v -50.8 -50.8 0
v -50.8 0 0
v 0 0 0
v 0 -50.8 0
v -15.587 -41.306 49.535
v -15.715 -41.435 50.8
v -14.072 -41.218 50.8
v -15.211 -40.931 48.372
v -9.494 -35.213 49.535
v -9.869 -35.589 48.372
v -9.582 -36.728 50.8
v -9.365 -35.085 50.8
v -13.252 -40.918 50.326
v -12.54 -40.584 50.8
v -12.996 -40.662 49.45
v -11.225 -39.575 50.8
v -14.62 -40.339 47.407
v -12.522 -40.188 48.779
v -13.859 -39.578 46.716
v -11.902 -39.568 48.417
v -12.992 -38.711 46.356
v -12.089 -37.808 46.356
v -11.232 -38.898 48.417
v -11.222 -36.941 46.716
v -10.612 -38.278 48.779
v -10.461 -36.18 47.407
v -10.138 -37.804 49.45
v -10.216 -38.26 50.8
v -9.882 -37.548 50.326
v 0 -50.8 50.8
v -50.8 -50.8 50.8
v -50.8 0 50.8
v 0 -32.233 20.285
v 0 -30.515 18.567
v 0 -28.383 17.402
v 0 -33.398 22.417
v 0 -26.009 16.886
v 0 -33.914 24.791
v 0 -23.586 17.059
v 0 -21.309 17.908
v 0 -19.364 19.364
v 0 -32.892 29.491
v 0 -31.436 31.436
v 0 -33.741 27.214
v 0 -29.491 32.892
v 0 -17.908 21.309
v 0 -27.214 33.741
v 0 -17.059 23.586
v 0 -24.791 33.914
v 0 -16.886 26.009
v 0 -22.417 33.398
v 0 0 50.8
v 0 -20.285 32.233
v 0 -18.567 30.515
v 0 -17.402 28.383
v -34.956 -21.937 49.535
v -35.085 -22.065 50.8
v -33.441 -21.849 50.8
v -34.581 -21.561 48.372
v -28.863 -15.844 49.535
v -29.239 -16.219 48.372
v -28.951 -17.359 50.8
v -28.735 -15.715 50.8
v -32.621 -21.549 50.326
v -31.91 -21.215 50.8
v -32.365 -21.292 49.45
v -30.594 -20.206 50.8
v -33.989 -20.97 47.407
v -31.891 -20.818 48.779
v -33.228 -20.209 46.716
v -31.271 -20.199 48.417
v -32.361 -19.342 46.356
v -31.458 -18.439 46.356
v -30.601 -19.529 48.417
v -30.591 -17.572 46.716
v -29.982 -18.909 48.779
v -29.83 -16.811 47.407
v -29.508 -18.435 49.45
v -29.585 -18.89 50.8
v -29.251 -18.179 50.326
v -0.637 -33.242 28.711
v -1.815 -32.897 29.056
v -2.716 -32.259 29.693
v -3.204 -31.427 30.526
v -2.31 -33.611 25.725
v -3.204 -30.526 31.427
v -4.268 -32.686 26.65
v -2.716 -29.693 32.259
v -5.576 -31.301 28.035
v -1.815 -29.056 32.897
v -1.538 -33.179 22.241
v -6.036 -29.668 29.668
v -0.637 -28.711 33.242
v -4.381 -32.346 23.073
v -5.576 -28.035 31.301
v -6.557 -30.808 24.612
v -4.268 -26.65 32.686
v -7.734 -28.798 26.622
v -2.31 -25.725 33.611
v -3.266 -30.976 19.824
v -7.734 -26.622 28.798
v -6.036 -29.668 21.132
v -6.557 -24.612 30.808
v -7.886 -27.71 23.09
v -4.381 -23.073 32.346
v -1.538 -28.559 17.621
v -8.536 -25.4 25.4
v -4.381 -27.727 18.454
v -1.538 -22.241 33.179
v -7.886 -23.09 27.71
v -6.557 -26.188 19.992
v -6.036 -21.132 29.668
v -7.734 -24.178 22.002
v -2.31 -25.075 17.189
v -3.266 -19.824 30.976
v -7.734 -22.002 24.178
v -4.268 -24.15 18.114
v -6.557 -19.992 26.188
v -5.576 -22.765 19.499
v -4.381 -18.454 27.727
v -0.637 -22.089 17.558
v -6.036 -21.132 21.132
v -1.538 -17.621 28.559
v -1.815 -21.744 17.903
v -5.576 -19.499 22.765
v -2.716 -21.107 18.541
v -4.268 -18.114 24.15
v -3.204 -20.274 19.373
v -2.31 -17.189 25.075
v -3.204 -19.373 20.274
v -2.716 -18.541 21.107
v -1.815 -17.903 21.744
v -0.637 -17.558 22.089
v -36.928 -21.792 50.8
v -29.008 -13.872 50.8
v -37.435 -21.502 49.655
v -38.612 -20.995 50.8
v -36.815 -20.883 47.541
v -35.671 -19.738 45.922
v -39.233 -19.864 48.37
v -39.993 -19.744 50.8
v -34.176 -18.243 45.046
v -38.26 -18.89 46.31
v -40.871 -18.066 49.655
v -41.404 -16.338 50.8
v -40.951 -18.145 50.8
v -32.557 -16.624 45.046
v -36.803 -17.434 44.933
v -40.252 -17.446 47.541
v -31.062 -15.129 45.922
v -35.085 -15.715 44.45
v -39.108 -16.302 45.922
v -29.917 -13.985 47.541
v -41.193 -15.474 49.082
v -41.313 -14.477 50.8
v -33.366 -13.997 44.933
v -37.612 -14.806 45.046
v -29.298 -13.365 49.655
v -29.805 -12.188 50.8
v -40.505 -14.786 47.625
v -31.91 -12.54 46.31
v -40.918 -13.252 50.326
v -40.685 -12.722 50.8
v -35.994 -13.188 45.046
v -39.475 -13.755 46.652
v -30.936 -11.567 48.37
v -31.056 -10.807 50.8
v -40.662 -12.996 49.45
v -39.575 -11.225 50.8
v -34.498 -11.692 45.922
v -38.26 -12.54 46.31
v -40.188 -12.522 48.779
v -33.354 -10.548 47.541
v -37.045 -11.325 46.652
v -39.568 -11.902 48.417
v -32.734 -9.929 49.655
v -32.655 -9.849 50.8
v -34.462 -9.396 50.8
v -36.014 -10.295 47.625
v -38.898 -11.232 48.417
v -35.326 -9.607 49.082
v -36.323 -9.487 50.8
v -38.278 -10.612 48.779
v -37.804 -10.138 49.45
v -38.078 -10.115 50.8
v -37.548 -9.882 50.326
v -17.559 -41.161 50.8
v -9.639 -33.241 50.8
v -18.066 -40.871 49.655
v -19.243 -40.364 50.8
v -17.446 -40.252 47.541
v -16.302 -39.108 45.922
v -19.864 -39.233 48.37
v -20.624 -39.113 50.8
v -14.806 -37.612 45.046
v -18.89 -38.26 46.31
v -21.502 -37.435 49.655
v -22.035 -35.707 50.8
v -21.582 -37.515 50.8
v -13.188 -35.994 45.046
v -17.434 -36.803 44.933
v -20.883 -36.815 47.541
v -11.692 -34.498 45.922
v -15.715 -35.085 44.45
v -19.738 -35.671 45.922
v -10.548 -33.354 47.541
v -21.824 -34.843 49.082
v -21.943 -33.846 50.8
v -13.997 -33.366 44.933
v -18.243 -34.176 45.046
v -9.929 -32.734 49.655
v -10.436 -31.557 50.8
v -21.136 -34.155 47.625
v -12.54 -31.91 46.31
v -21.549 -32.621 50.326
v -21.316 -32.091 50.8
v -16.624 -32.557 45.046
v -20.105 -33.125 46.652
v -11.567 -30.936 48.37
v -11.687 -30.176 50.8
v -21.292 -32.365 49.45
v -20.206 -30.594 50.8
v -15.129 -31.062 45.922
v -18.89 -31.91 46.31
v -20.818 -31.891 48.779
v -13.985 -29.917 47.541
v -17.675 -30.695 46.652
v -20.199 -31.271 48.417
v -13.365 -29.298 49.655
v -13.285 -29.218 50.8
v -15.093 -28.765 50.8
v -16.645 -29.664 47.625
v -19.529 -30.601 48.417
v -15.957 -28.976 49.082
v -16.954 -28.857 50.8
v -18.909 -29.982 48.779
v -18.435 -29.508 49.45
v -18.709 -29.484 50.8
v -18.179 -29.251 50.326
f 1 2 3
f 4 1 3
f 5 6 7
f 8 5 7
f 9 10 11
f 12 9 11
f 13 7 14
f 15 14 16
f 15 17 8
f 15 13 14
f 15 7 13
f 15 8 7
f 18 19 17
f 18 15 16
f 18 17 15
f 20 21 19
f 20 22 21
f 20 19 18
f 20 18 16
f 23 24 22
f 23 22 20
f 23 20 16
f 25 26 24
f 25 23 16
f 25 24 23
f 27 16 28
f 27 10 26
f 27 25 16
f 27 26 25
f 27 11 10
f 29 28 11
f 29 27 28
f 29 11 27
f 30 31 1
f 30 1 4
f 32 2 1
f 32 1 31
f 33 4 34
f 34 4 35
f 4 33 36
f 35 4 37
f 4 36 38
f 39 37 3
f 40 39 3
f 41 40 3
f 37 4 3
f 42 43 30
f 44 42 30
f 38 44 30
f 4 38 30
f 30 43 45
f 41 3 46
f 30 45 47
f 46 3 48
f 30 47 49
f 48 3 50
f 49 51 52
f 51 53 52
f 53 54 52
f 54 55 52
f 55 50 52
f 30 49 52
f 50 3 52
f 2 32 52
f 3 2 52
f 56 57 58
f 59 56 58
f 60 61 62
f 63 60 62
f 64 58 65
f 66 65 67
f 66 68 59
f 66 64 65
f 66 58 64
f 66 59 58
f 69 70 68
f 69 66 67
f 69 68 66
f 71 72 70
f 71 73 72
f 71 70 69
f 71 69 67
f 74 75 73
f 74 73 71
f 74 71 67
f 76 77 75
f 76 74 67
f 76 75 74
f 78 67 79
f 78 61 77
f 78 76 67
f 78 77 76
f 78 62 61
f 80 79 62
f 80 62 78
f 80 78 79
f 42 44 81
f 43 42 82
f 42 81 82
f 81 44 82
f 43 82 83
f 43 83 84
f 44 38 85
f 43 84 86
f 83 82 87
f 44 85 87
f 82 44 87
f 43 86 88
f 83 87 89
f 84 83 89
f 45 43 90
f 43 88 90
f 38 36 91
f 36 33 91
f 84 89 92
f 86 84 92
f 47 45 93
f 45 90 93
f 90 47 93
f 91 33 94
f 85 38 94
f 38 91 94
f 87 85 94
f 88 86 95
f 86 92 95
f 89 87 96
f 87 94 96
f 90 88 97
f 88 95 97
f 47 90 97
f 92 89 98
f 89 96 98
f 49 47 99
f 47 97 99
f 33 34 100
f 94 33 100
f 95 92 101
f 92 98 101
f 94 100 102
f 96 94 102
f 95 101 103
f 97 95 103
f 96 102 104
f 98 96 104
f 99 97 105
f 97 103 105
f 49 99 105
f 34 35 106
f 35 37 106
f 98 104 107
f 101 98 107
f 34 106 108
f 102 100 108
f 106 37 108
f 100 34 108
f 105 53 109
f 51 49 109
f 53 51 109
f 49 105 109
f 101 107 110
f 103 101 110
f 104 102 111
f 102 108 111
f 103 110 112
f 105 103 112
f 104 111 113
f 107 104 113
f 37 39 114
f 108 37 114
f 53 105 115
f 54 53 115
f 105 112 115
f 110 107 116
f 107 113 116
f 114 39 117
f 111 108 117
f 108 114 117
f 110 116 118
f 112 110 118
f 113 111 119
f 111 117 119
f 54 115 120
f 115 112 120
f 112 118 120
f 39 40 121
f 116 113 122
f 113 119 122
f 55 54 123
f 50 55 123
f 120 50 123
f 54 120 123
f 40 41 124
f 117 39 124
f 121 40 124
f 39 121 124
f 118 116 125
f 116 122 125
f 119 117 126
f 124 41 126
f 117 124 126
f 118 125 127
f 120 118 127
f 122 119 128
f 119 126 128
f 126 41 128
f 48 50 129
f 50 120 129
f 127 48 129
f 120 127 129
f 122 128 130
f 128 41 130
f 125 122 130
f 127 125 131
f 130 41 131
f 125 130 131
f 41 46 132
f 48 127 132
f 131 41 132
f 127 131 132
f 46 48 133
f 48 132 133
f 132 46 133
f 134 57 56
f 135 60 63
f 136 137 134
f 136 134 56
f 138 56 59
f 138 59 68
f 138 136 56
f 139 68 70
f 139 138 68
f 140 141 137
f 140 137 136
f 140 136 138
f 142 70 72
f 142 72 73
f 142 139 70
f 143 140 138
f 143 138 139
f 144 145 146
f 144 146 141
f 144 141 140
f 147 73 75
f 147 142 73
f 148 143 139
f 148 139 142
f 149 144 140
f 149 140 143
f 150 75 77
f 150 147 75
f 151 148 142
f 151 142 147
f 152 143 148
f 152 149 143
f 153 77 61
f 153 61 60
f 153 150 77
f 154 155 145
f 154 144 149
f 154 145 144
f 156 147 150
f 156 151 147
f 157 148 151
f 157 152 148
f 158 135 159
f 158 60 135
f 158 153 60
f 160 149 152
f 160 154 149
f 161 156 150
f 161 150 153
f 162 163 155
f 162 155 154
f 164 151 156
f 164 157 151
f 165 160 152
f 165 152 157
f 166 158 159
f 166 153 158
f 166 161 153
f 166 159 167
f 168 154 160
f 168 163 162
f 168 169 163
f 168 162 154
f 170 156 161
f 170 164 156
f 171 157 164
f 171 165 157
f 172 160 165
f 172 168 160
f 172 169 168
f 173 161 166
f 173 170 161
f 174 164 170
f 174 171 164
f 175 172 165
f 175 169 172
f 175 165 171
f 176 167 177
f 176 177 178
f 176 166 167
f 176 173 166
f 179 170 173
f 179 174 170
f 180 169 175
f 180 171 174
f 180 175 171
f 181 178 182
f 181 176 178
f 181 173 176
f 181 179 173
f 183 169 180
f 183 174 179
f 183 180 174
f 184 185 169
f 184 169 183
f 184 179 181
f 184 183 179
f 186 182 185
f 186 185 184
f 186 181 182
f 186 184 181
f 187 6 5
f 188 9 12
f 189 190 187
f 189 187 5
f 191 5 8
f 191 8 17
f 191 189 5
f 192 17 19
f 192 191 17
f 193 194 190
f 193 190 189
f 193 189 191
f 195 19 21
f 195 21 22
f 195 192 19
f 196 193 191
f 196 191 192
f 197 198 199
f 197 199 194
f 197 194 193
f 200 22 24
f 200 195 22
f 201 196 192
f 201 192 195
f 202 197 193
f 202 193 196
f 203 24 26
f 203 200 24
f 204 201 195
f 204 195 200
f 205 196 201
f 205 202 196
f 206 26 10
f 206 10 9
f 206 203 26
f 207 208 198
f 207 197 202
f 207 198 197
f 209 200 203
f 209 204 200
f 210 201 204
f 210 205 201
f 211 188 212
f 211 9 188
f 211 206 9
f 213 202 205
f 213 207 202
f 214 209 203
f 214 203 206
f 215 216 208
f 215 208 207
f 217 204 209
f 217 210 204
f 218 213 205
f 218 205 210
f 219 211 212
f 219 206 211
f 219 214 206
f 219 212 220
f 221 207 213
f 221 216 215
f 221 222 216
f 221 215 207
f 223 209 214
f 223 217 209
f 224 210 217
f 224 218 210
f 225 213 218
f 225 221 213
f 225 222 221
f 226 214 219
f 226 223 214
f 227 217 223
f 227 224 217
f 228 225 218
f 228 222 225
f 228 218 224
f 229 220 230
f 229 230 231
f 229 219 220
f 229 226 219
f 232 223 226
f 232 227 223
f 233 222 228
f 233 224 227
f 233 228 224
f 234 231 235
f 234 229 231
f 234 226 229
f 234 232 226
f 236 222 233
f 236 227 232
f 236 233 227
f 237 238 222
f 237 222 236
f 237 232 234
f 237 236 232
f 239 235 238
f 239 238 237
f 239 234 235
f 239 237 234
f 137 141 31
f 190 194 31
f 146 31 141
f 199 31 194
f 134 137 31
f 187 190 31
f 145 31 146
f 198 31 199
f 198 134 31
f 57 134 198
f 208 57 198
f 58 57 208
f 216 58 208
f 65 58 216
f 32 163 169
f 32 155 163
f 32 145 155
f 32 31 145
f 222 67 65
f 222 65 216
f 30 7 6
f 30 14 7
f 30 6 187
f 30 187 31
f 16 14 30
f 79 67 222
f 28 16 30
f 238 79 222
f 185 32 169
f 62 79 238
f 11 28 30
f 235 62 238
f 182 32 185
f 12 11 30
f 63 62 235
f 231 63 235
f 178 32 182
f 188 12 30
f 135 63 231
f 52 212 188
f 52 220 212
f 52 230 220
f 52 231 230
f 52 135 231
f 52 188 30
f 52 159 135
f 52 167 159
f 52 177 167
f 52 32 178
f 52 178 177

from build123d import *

# Parameters (mm, degrees)
F0_W     = 50.8
F0_H     = 50.8
F1_DEPTH = 50.8


with BuildPart() as f1:
    # F0 (on Front) → F1 (new body)
    with BuildSketch(Plane.XZ):
        with Locations((-25.4, 25.4)):
            Rectangle(F0_W, F0_H)
    extrude(amount=F1_DEPTH)

    # F2 (on face) → F3 (revolve, cut)
    with BuildSketch(Plane.YZ):
        with BuildLine():
            Line((-19.3643093263, 19.3643093263), (-31.4356906737, 31.4356906737))
            ThreePointArc((-31.4356906737, 31.4356906737), (-31.4356906737, 19.3643093263), (-19.3643093263, 19.3643093263))
        make_face()
    revolve(axis=Axis((0, -25.4, 25.4), (0, 0.7071067812, -0.7071067812)), mode=Mode.SUBTRACT)

    # F4 (on face) → F5 (revolve, cut)
    with BuildSketch(Plane.XY.offset(50.8)):
        with BuildLine():
            ThreePointArc((-28.7345517881, -15.7154482119), (-32.6545119926, -9.8488131804), (-39.5746798487, -11.2253201513))
            Line((-39.5746798487, -11.2253201513), (-30.5944237276, -20.2055762724))
            ThreePointArc((-30.5944237276, -20.2055762724), (-29.2179167567, -18.1454880074), (-28.7345517881, -15.7154482119))
        make_face()
        with BuildLine():
            ThreePointArc((-9.3654482119, -35.0845517881), (-13.2854084164, -29.2179167567), (-20.2055762724, -30.5944237276))
            Line((-20.2055762724, -30.5944237276), (-11.2253201513, -39.5746798487))
            ThreePointArc((-11.2253201513, -39.5746798487), (-9.8488131804, -37.5145915836), (-9.3654482119, -35.0845517881))
        make_face()
    revolve(axis=Axis((-25.4, -25.4, 50.8), (0.7071067812, -0.7071067812, 0)), mode=Mode.SUBTRACT)


solid = f1.part
